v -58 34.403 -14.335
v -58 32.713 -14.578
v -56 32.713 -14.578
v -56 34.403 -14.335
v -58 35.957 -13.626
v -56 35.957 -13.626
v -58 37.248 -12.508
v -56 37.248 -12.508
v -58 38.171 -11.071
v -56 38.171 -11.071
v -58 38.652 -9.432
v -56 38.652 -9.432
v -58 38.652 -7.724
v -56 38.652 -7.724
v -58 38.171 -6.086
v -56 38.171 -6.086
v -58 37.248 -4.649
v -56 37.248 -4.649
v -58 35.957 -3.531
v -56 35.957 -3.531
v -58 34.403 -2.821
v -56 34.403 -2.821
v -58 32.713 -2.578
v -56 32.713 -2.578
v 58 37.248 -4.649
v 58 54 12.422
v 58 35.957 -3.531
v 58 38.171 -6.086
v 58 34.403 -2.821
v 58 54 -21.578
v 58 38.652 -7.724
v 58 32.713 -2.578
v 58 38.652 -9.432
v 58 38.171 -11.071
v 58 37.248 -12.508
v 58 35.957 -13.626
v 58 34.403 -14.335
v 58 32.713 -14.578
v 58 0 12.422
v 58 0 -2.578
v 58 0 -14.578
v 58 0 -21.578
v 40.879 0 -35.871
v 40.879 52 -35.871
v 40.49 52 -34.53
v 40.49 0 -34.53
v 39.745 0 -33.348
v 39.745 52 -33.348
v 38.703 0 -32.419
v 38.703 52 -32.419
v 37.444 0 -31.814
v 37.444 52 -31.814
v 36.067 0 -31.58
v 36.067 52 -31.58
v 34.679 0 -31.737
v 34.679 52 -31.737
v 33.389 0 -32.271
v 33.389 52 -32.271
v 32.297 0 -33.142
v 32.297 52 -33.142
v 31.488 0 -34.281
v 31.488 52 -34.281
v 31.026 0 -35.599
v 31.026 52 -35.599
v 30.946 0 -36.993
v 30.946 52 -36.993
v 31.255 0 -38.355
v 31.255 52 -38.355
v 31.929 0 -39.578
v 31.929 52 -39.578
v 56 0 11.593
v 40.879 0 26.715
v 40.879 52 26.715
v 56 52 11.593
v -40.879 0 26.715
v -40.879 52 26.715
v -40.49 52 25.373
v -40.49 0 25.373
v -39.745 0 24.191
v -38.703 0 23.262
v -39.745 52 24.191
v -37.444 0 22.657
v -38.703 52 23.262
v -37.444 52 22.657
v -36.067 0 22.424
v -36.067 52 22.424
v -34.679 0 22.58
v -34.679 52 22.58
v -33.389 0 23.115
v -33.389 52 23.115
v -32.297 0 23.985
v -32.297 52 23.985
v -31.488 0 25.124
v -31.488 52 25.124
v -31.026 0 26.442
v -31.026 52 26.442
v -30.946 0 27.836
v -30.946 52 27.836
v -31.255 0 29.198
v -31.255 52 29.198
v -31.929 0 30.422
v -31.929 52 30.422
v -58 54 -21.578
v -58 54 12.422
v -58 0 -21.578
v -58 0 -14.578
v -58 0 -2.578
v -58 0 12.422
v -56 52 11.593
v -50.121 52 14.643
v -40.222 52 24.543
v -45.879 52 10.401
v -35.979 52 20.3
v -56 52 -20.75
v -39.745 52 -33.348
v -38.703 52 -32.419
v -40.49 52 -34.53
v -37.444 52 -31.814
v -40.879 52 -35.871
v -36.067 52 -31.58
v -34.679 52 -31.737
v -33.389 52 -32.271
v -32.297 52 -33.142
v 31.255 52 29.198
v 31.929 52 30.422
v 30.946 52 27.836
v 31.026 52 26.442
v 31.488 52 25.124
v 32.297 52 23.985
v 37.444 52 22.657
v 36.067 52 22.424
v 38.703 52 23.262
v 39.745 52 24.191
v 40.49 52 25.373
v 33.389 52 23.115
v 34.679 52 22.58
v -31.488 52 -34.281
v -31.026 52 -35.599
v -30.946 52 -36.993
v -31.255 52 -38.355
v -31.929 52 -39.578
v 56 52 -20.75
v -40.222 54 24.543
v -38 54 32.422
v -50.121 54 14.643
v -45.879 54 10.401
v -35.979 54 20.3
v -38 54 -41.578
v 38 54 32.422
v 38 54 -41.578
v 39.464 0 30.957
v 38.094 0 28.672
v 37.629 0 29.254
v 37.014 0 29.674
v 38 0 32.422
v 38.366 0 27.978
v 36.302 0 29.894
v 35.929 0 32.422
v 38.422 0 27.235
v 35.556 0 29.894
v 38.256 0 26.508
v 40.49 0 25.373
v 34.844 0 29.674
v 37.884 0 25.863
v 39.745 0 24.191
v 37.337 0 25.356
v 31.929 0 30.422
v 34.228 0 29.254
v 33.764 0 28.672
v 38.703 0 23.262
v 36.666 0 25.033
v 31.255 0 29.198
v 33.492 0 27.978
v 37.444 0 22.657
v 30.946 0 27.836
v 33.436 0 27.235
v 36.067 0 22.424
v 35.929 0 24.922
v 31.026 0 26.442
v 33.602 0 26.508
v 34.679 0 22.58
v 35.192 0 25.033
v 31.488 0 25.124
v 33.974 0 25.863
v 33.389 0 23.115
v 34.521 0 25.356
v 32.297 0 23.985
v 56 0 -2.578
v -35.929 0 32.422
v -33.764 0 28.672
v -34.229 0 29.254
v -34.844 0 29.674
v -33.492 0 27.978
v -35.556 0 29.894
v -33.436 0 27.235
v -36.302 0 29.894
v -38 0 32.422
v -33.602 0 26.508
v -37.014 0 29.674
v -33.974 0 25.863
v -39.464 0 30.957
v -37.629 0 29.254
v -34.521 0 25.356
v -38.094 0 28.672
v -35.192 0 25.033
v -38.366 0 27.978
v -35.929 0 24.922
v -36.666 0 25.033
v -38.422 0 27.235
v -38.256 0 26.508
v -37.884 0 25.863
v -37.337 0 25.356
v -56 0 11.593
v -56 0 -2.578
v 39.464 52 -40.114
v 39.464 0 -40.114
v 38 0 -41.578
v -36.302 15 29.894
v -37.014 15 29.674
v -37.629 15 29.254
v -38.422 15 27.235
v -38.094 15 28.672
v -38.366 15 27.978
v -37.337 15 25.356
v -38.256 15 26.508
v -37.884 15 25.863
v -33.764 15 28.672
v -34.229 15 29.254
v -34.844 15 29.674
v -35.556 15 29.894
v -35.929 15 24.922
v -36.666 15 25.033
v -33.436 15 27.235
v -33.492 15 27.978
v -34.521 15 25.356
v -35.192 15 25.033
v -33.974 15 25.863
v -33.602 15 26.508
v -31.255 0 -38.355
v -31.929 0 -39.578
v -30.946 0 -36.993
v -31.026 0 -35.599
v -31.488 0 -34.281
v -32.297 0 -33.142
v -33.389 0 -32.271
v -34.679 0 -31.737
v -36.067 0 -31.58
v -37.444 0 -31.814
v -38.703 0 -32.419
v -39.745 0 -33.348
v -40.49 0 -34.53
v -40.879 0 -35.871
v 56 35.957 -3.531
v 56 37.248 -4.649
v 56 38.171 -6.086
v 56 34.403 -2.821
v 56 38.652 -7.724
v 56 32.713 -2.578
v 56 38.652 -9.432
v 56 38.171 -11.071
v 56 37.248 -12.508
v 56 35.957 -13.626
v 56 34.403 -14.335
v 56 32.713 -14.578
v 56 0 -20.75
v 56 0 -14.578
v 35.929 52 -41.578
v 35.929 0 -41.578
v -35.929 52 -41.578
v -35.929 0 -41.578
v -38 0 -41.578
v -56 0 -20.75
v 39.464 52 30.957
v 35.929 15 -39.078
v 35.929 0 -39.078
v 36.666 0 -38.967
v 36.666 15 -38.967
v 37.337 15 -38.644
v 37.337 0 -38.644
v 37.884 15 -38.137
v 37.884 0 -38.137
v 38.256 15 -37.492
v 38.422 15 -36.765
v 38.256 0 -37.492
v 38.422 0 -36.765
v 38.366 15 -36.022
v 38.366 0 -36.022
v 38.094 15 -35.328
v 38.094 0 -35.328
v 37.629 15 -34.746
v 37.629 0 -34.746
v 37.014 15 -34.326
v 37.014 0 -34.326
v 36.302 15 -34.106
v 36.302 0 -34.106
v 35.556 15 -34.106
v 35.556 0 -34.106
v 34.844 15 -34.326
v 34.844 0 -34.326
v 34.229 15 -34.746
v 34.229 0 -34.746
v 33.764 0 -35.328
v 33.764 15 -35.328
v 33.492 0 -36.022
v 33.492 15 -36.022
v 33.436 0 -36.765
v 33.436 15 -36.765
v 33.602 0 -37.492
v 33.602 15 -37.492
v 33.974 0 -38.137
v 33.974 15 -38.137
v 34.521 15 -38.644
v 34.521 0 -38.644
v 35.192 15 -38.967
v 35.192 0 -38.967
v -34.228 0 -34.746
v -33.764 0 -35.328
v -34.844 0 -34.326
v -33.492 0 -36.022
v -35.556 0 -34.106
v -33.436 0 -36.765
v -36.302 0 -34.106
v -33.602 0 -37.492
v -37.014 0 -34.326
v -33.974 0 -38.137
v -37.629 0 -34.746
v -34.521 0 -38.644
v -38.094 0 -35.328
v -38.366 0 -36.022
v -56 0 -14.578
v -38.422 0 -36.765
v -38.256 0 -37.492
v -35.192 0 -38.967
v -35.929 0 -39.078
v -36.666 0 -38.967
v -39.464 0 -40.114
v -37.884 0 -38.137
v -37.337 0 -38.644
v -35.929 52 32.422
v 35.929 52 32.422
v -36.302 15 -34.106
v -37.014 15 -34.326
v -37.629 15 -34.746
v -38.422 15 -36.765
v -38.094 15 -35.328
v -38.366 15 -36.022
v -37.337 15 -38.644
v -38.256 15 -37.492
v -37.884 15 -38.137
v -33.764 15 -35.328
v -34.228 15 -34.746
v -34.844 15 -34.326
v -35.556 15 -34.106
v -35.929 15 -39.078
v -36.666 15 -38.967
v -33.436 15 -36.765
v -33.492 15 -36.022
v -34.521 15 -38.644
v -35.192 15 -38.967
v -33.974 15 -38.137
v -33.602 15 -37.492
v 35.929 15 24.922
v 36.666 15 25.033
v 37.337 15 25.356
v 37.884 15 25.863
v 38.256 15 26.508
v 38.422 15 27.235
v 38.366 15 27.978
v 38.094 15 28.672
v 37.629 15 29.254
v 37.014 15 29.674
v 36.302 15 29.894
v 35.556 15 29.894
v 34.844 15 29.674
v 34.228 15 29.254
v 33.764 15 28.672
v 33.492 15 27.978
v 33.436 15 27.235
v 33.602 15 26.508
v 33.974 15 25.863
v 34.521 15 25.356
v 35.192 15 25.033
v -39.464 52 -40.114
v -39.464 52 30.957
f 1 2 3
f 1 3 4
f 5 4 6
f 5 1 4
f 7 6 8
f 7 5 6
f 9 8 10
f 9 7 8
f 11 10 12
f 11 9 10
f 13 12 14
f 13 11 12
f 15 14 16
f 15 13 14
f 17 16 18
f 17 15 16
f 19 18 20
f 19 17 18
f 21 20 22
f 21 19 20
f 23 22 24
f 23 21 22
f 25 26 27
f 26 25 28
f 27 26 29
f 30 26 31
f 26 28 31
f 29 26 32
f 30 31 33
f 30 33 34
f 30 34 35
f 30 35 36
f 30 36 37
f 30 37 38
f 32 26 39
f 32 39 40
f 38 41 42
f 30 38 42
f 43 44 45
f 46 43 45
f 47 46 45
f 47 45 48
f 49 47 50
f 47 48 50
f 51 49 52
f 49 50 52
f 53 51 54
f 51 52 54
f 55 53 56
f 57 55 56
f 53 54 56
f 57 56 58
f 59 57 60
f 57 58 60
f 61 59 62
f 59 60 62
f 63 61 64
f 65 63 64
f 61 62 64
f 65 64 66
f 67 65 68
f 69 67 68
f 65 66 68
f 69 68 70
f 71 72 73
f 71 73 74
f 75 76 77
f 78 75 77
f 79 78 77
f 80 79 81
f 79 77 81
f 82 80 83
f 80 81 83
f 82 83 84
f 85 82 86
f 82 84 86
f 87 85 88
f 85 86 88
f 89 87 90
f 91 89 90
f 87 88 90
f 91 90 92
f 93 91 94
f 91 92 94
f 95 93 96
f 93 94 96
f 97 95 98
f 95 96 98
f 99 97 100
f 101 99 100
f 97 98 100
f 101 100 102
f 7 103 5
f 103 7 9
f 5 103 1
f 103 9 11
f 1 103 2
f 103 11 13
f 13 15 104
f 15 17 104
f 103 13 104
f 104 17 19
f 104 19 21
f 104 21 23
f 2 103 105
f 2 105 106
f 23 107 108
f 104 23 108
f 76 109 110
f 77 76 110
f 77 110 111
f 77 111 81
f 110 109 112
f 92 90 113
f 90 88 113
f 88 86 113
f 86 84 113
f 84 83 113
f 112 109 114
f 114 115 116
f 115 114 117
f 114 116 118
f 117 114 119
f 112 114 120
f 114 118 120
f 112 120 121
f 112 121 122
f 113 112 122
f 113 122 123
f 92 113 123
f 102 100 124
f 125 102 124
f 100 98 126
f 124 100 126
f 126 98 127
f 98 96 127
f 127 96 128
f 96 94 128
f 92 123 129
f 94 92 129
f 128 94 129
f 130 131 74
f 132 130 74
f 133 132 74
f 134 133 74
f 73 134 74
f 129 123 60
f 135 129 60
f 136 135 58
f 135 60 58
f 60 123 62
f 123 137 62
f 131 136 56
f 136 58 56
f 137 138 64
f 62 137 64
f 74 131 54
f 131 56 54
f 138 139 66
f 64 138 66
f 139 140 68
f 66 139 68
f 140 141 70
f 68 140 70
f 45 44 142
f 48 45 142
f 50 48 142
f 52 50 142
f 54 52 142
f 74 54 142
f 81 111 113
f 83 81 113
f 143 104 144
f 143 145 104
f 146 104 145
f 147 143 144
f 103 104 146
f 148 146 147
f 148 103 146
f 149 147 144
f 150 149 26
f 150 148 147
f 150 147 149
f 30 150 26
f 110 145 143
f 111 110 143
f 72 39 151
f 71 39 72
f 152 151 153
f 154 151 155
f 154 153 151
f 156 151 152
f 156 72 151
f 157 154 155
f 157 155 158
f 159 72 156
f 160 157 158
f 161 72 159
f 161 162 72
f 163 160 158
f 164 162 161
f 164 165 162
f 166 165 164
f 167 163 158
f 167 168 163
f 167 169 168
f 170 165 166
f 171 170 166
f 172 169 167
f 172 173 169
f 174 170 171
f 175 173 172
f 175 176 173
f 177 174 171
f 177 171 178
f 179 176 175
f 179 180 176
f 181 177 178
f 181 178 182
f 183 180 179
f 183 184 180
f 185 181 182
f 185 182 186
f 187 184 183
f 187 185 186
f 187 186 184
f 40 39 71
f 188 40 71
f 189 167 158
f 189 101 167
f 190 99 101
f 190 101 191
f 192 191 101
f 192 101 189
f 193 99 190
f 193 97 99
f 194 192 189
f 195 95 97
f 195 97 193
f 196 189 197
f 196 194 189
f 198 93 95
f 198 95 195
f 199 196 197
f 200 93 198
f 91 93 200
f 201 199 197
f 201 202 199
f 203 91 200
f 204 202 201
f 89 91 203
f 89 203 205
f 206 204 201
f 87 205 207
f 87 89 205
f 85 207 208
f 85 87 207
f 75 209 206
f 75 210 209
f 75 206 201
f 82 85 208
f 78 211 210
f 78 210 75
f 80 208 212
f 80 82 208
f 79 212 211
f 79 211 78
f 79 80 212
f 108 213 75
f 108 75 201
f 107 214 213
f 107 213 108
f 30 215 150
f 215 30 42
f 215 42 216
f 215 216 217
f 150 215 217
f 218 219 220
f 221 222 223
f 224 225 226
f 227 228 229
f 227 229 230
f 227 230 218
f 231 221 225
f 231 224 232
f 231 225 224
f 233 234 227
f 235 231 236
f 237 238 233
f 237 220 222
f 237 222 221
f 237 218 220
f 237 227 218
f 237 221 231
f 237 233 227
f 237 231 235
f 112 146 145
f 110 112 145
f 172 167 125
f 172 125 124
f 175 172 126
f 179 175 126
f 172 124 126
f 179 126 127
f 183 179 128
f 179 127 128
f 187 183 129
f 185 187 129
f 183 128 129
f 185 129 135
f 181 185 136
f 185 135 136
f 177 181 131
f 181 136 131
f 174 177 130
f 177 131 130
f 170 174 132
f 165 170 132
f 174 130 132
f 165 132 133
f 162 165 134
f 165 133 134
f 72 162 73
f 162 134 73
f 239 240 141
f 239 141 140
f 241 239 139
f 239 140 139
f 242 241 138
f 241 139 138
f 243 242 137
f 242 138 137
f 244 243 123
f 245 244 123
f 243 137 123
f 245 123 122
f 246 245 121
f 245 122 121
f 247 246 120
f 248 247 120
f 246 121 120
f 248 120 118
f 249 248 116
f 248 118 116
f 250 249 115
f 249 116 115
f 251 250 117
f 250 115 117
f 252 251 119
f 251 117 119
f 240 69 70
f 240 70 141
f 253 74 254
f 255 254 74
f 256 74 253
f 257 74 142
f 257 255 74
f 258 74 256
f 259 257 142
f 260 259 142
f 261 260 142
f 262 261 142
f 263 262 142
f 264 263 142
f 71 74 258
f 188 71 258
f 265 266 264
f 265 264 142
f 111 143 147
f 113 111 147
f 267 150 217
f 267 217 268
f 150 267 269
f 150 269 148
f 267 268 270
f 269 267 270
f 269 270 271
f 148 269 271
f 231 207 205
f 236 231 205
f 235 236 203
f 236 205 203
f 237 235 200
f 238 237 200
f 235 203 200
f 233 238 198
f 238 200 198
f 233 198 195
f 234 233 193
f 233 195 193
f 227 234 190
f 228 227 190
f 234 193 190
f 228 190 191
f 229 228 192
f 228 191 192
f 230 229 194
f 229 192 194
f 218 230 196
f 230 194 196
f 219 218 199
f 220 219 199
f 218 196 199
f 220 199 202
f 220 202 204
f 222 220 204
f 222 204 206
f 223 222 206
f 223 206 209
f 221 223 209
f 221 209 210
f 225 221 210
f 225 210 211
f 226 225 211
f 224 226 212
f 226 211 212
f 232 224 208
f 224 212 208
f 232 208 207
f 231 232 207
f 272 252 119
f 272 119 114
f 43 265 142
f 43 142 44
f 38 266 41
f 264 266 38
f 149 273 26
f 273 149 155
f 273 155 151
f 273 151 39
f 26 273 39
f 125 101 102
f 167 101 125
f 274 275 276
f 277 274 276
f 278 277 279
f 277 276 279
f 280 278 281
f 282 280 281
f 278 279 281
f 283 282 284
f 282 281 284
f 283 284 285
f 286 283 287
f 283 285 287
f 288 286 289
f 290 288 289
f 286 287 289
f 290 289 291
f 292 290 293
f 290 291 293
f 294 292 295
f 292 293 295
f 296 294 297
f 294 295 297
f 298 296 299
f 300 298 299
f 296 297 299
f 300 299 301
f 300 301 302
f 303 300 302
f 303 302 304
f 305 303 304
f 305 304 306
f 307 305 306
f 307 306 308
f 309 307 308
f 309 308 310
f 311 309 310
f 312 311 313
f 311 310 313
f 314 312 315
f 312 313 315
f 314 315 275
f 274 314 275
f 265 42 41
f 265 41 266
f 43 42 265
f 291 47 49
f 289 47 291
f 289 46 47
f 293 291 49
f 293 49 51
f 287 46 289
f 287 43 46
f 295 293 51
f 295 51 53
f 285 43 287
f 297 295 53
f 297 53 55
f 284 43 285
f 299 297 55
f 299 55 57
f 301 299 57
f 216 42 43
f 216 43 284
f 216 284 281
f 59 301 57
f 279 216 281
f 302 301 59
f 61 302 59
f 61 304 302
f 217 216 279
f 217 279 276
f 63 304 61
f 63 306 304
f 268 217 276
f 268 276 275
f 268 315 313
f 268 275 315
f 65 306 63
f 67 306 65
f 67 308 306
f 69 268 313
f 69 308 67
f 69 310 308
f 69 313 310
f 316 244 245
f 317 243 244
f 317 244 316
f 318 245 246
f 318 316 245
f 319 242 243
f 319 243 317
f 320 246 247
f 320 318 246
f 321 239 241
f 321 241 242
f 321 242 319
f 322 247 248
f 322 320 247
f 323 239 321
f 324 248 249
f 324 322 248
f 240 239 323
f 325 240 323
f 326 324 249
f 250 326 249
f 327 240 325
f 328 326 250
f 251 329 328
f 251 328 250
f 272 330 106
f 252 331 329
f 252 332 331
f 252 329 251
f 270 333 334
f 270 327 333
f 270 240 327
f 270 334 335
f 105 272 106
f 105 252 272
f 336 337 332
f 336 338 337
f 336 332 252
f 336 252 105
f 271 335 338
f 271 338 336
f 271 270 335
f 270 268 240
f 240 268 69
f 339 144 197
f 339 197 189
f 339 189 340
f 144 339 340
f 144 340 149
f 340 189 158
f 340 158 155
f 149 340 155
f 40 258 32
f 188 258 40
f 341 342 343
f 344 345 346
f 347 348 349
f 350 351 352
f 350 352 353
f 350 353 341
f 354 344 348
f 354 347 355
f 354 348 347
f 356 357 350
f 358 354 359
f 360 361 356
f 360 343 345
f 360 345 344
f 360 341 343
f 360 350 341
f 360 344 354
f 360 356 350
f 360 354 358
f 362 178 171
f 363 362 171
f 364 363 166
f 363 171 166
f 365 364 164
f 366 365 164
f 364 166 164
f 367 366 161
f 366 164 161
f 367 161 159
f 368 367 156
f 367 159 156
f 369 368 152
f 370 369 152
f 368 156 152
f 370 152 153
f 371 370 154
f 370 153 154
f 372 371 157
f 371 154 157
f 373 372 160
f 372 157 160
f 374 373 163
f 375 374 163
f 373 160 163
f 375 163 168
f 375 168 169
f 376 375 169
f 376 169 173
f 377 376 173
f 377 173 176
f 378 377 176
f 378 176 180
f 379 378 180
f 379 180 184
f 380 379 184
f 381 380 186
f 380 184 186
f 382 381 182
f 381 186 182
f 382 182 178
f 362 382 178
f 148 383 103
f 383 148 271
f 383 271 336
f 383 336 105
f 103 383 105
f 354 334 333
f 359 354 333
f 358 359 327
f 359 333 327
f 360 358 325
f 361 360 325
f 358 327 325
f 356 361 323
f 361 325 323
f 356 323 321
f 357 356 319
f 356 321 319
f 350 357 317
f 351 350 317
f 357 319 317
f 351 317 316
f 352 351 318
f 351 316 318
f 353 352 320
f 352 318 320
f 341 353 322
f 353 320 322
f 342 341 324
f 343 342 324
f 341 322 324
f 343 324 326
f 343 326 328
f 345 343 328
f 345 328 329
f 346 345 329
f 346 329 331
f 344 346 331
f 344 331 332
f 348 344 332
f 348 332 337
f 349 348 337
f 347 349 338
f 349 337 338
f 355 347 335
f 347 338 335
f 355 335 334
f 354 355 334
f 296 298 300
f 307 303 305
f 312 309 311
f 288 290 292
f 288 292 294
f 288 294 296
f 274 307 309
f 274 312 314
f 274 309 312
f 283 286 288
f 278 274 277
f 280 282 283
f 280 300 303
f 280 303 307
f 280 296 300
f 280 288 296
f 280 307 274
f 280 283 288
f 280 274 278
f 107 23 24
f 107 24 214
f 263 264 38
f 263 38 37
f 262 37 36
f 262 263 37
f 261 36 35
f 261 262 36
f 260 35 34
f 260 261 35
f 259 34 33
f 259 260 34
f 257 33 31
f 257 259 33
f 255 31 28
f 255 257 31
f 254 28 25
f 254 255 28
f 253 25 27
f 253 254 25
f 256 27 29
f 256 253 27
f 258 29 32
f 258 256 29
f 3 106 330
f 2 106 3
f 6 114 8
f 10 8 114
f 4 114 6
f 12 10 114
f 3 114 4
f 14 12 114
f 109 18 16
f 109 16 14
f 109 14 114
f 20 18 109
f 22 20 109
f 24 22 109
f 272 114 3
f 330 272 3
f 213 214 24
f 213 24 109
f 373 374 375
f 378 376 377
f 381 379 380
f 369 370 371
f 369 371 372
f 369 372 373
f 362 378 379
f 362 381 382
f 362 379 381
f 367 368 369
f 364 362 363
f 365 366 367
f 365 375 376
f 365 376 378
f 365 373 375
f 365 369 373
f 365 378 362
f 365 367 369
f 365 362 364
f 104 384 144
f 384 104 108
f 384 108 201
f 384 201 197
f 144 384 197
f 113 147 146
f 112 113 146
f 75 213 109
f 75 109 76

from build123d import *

# Parameters (mm, degrees)
BOSS_EXTRUDE1_DEPTH = 52
BOSS_EXTRUDE2_DEPTH = 2
SKETCH3_R           = 5
BOSS_EXTRUDE3_DEPTH = 52
SKETCH4_R           = 2.5
CUT_EXTRUDE1_DEPTH  = 15
CUT_EXTRUDE2_DEPTH  = 15
CUT_EXTRUDE3_REACH  = 136.539


with BuildPart() as part:
    # Sketch1 → Boss-Extrude1 (new body)
    with BuildSketch(Plane(origin=(0, 0, 0), x_dir=(1, 0, 0), z_dir=(0, 1, 0))):
        Polygon((38, -32.421617333), (-38, -32.421617333), (-58, -12.421649809), (-58, 21.578350191), (-38, 41.578382667), (38, 41.578382667), (58, 21.578415143), (58, -12.421584857), align=None)
        Polygon((-37.171571924, 39.578382667), (-56, 20.749924017), (-56, -11.593221733), (-37.171573826, -30.421617333), (37.171571924, -30.421617333), (56, -11.593158683), (56, 20.749987067), (37.171573826, 39.578382667), align=None, mode=Mode.SUBTRACT)
    extrude(amount=BOSS_EXTRUDE1_DEPTH)

    # Sketch2 → Boss-Extrude2 (add)
    with BuildSketch(Plane(origin=(0, 52, 0), x_dir=(1, 0, 0), z_dir=(0, 1, 0))):
        Polygon((38, -32.421617333), (58, -12.421584857), (58, 21.578415143), (38, 41.578382667), (-38, 41.578382667), (-58, 21.578350191), (-58, -12.421649809), (-38, -32.421617333), align=None)
    extrude(amount=BOSS_EXTRUDE2_DEPTH)

    # Sketch3 → Boss-Extrude3 (add)
    with BuildSketch(Plane.XZ.offset(-52)):
        with Locations((35.928934566, -36.578382667)):
            Circle(SKETCH3_R)
        with Locations((-35.92892981, -36.578382667)):
            Circle(SKETCH3_R)
        with Locations((-35.928934566, 27.421617333)):
            Circle(SKETCH3_R)
        with Locations((35.92892981, 27.421617333)):
            Circle(SKETCH3_R)
    extrude(amount=BOSS_EXTRUDE3_DEPTH)

    # Sketch4 → Cut-Extrude1 (cut)
    with BuildSketch(Plane(origin=(0, 0, 0), x_dir=(-1, 0, 0), z_dir=(0, -1, 0))):
        with Locations(Location((-35.928934566, 36.578382667, 0), (0, 0, 90))):
            Circle(SKETCH4_R)
        with Locations(Location((35.92892981, 36.578382667, 0), (0, 0, 90))):
            Circle(SKETCH4_R)
        with Locations(Location((35.928934566, -27.421617333, 0), (0, 0, 90))):
            Circle(SKETCH4_R)
        with Locations(Location((-35.92892981, -27.421617333, 0), (0, 0, 90))):
            Circle(SKETCH4_R)
    extrude(amount=-CUT_EXTRUDE1_DEPTH, mode=Mode.SUBTRACT)

    # Sketch5 → Cut-Extrude2 (cut)
    with BuildSketch(Plane(origin=(0, 54, 0), x_dir=(1, 0, 0), z_dir=(0, 1, 0))):
        Polygon((-50.121326659, -14.6434607), (-40.221823685, -24.5429476), (-35.979186442, -20.300303468), (-45.878689416, -10.400816569), align=None)
    extrude(amount=-CUT_EXTRUDE2_DEPTH, mode=Mode.SUBTRACT)

    # Cut-Extrude3: up to this face of the body (flat: up to its plane)
    cut_extrude3_end = Plane(part.part.faces().sort_by_distance((58, 27, -4.578415143))[0])
    # Sketch6 → Cut-Extrude3 (cut, up to the picked face)
    with BuildSketch(Plane.ZY.offset(58), mode=Mode.PRIVATE) as cut_extrude3_sk1:
        with BuildLine():
            Line((-14.578350191, 0), (-14.578350191, 32.713069052))
            ThreePointArc((-14.578350191, 32.713069052), (-8.578350191, 38.713069052), (-2.578350191, 32.713069052))
            Line((-2.578350191, 32.713069052), (-2.578350191, 0))
            Line((-2.578350191, 0), (-14.578350191, 0))
        make_face()
    cut_extrude3_tool1 = split(extrude(cut_extrude3_sk1.sketch, amount=-CUT_EXTRUDE3_REACH, mode=Mode.PRIVATE), bisect_by=cut_extrude3_end, keep=Keep.BOTH, mode=Mode.PRIVATE)
    add(cut_extrude3_tool1.solids().sort_by(Axis((-58, 18.736689, -8.57835), (1, 0, 0)))[0], mode=Mode.SUBTRACT)


solid = part.part
